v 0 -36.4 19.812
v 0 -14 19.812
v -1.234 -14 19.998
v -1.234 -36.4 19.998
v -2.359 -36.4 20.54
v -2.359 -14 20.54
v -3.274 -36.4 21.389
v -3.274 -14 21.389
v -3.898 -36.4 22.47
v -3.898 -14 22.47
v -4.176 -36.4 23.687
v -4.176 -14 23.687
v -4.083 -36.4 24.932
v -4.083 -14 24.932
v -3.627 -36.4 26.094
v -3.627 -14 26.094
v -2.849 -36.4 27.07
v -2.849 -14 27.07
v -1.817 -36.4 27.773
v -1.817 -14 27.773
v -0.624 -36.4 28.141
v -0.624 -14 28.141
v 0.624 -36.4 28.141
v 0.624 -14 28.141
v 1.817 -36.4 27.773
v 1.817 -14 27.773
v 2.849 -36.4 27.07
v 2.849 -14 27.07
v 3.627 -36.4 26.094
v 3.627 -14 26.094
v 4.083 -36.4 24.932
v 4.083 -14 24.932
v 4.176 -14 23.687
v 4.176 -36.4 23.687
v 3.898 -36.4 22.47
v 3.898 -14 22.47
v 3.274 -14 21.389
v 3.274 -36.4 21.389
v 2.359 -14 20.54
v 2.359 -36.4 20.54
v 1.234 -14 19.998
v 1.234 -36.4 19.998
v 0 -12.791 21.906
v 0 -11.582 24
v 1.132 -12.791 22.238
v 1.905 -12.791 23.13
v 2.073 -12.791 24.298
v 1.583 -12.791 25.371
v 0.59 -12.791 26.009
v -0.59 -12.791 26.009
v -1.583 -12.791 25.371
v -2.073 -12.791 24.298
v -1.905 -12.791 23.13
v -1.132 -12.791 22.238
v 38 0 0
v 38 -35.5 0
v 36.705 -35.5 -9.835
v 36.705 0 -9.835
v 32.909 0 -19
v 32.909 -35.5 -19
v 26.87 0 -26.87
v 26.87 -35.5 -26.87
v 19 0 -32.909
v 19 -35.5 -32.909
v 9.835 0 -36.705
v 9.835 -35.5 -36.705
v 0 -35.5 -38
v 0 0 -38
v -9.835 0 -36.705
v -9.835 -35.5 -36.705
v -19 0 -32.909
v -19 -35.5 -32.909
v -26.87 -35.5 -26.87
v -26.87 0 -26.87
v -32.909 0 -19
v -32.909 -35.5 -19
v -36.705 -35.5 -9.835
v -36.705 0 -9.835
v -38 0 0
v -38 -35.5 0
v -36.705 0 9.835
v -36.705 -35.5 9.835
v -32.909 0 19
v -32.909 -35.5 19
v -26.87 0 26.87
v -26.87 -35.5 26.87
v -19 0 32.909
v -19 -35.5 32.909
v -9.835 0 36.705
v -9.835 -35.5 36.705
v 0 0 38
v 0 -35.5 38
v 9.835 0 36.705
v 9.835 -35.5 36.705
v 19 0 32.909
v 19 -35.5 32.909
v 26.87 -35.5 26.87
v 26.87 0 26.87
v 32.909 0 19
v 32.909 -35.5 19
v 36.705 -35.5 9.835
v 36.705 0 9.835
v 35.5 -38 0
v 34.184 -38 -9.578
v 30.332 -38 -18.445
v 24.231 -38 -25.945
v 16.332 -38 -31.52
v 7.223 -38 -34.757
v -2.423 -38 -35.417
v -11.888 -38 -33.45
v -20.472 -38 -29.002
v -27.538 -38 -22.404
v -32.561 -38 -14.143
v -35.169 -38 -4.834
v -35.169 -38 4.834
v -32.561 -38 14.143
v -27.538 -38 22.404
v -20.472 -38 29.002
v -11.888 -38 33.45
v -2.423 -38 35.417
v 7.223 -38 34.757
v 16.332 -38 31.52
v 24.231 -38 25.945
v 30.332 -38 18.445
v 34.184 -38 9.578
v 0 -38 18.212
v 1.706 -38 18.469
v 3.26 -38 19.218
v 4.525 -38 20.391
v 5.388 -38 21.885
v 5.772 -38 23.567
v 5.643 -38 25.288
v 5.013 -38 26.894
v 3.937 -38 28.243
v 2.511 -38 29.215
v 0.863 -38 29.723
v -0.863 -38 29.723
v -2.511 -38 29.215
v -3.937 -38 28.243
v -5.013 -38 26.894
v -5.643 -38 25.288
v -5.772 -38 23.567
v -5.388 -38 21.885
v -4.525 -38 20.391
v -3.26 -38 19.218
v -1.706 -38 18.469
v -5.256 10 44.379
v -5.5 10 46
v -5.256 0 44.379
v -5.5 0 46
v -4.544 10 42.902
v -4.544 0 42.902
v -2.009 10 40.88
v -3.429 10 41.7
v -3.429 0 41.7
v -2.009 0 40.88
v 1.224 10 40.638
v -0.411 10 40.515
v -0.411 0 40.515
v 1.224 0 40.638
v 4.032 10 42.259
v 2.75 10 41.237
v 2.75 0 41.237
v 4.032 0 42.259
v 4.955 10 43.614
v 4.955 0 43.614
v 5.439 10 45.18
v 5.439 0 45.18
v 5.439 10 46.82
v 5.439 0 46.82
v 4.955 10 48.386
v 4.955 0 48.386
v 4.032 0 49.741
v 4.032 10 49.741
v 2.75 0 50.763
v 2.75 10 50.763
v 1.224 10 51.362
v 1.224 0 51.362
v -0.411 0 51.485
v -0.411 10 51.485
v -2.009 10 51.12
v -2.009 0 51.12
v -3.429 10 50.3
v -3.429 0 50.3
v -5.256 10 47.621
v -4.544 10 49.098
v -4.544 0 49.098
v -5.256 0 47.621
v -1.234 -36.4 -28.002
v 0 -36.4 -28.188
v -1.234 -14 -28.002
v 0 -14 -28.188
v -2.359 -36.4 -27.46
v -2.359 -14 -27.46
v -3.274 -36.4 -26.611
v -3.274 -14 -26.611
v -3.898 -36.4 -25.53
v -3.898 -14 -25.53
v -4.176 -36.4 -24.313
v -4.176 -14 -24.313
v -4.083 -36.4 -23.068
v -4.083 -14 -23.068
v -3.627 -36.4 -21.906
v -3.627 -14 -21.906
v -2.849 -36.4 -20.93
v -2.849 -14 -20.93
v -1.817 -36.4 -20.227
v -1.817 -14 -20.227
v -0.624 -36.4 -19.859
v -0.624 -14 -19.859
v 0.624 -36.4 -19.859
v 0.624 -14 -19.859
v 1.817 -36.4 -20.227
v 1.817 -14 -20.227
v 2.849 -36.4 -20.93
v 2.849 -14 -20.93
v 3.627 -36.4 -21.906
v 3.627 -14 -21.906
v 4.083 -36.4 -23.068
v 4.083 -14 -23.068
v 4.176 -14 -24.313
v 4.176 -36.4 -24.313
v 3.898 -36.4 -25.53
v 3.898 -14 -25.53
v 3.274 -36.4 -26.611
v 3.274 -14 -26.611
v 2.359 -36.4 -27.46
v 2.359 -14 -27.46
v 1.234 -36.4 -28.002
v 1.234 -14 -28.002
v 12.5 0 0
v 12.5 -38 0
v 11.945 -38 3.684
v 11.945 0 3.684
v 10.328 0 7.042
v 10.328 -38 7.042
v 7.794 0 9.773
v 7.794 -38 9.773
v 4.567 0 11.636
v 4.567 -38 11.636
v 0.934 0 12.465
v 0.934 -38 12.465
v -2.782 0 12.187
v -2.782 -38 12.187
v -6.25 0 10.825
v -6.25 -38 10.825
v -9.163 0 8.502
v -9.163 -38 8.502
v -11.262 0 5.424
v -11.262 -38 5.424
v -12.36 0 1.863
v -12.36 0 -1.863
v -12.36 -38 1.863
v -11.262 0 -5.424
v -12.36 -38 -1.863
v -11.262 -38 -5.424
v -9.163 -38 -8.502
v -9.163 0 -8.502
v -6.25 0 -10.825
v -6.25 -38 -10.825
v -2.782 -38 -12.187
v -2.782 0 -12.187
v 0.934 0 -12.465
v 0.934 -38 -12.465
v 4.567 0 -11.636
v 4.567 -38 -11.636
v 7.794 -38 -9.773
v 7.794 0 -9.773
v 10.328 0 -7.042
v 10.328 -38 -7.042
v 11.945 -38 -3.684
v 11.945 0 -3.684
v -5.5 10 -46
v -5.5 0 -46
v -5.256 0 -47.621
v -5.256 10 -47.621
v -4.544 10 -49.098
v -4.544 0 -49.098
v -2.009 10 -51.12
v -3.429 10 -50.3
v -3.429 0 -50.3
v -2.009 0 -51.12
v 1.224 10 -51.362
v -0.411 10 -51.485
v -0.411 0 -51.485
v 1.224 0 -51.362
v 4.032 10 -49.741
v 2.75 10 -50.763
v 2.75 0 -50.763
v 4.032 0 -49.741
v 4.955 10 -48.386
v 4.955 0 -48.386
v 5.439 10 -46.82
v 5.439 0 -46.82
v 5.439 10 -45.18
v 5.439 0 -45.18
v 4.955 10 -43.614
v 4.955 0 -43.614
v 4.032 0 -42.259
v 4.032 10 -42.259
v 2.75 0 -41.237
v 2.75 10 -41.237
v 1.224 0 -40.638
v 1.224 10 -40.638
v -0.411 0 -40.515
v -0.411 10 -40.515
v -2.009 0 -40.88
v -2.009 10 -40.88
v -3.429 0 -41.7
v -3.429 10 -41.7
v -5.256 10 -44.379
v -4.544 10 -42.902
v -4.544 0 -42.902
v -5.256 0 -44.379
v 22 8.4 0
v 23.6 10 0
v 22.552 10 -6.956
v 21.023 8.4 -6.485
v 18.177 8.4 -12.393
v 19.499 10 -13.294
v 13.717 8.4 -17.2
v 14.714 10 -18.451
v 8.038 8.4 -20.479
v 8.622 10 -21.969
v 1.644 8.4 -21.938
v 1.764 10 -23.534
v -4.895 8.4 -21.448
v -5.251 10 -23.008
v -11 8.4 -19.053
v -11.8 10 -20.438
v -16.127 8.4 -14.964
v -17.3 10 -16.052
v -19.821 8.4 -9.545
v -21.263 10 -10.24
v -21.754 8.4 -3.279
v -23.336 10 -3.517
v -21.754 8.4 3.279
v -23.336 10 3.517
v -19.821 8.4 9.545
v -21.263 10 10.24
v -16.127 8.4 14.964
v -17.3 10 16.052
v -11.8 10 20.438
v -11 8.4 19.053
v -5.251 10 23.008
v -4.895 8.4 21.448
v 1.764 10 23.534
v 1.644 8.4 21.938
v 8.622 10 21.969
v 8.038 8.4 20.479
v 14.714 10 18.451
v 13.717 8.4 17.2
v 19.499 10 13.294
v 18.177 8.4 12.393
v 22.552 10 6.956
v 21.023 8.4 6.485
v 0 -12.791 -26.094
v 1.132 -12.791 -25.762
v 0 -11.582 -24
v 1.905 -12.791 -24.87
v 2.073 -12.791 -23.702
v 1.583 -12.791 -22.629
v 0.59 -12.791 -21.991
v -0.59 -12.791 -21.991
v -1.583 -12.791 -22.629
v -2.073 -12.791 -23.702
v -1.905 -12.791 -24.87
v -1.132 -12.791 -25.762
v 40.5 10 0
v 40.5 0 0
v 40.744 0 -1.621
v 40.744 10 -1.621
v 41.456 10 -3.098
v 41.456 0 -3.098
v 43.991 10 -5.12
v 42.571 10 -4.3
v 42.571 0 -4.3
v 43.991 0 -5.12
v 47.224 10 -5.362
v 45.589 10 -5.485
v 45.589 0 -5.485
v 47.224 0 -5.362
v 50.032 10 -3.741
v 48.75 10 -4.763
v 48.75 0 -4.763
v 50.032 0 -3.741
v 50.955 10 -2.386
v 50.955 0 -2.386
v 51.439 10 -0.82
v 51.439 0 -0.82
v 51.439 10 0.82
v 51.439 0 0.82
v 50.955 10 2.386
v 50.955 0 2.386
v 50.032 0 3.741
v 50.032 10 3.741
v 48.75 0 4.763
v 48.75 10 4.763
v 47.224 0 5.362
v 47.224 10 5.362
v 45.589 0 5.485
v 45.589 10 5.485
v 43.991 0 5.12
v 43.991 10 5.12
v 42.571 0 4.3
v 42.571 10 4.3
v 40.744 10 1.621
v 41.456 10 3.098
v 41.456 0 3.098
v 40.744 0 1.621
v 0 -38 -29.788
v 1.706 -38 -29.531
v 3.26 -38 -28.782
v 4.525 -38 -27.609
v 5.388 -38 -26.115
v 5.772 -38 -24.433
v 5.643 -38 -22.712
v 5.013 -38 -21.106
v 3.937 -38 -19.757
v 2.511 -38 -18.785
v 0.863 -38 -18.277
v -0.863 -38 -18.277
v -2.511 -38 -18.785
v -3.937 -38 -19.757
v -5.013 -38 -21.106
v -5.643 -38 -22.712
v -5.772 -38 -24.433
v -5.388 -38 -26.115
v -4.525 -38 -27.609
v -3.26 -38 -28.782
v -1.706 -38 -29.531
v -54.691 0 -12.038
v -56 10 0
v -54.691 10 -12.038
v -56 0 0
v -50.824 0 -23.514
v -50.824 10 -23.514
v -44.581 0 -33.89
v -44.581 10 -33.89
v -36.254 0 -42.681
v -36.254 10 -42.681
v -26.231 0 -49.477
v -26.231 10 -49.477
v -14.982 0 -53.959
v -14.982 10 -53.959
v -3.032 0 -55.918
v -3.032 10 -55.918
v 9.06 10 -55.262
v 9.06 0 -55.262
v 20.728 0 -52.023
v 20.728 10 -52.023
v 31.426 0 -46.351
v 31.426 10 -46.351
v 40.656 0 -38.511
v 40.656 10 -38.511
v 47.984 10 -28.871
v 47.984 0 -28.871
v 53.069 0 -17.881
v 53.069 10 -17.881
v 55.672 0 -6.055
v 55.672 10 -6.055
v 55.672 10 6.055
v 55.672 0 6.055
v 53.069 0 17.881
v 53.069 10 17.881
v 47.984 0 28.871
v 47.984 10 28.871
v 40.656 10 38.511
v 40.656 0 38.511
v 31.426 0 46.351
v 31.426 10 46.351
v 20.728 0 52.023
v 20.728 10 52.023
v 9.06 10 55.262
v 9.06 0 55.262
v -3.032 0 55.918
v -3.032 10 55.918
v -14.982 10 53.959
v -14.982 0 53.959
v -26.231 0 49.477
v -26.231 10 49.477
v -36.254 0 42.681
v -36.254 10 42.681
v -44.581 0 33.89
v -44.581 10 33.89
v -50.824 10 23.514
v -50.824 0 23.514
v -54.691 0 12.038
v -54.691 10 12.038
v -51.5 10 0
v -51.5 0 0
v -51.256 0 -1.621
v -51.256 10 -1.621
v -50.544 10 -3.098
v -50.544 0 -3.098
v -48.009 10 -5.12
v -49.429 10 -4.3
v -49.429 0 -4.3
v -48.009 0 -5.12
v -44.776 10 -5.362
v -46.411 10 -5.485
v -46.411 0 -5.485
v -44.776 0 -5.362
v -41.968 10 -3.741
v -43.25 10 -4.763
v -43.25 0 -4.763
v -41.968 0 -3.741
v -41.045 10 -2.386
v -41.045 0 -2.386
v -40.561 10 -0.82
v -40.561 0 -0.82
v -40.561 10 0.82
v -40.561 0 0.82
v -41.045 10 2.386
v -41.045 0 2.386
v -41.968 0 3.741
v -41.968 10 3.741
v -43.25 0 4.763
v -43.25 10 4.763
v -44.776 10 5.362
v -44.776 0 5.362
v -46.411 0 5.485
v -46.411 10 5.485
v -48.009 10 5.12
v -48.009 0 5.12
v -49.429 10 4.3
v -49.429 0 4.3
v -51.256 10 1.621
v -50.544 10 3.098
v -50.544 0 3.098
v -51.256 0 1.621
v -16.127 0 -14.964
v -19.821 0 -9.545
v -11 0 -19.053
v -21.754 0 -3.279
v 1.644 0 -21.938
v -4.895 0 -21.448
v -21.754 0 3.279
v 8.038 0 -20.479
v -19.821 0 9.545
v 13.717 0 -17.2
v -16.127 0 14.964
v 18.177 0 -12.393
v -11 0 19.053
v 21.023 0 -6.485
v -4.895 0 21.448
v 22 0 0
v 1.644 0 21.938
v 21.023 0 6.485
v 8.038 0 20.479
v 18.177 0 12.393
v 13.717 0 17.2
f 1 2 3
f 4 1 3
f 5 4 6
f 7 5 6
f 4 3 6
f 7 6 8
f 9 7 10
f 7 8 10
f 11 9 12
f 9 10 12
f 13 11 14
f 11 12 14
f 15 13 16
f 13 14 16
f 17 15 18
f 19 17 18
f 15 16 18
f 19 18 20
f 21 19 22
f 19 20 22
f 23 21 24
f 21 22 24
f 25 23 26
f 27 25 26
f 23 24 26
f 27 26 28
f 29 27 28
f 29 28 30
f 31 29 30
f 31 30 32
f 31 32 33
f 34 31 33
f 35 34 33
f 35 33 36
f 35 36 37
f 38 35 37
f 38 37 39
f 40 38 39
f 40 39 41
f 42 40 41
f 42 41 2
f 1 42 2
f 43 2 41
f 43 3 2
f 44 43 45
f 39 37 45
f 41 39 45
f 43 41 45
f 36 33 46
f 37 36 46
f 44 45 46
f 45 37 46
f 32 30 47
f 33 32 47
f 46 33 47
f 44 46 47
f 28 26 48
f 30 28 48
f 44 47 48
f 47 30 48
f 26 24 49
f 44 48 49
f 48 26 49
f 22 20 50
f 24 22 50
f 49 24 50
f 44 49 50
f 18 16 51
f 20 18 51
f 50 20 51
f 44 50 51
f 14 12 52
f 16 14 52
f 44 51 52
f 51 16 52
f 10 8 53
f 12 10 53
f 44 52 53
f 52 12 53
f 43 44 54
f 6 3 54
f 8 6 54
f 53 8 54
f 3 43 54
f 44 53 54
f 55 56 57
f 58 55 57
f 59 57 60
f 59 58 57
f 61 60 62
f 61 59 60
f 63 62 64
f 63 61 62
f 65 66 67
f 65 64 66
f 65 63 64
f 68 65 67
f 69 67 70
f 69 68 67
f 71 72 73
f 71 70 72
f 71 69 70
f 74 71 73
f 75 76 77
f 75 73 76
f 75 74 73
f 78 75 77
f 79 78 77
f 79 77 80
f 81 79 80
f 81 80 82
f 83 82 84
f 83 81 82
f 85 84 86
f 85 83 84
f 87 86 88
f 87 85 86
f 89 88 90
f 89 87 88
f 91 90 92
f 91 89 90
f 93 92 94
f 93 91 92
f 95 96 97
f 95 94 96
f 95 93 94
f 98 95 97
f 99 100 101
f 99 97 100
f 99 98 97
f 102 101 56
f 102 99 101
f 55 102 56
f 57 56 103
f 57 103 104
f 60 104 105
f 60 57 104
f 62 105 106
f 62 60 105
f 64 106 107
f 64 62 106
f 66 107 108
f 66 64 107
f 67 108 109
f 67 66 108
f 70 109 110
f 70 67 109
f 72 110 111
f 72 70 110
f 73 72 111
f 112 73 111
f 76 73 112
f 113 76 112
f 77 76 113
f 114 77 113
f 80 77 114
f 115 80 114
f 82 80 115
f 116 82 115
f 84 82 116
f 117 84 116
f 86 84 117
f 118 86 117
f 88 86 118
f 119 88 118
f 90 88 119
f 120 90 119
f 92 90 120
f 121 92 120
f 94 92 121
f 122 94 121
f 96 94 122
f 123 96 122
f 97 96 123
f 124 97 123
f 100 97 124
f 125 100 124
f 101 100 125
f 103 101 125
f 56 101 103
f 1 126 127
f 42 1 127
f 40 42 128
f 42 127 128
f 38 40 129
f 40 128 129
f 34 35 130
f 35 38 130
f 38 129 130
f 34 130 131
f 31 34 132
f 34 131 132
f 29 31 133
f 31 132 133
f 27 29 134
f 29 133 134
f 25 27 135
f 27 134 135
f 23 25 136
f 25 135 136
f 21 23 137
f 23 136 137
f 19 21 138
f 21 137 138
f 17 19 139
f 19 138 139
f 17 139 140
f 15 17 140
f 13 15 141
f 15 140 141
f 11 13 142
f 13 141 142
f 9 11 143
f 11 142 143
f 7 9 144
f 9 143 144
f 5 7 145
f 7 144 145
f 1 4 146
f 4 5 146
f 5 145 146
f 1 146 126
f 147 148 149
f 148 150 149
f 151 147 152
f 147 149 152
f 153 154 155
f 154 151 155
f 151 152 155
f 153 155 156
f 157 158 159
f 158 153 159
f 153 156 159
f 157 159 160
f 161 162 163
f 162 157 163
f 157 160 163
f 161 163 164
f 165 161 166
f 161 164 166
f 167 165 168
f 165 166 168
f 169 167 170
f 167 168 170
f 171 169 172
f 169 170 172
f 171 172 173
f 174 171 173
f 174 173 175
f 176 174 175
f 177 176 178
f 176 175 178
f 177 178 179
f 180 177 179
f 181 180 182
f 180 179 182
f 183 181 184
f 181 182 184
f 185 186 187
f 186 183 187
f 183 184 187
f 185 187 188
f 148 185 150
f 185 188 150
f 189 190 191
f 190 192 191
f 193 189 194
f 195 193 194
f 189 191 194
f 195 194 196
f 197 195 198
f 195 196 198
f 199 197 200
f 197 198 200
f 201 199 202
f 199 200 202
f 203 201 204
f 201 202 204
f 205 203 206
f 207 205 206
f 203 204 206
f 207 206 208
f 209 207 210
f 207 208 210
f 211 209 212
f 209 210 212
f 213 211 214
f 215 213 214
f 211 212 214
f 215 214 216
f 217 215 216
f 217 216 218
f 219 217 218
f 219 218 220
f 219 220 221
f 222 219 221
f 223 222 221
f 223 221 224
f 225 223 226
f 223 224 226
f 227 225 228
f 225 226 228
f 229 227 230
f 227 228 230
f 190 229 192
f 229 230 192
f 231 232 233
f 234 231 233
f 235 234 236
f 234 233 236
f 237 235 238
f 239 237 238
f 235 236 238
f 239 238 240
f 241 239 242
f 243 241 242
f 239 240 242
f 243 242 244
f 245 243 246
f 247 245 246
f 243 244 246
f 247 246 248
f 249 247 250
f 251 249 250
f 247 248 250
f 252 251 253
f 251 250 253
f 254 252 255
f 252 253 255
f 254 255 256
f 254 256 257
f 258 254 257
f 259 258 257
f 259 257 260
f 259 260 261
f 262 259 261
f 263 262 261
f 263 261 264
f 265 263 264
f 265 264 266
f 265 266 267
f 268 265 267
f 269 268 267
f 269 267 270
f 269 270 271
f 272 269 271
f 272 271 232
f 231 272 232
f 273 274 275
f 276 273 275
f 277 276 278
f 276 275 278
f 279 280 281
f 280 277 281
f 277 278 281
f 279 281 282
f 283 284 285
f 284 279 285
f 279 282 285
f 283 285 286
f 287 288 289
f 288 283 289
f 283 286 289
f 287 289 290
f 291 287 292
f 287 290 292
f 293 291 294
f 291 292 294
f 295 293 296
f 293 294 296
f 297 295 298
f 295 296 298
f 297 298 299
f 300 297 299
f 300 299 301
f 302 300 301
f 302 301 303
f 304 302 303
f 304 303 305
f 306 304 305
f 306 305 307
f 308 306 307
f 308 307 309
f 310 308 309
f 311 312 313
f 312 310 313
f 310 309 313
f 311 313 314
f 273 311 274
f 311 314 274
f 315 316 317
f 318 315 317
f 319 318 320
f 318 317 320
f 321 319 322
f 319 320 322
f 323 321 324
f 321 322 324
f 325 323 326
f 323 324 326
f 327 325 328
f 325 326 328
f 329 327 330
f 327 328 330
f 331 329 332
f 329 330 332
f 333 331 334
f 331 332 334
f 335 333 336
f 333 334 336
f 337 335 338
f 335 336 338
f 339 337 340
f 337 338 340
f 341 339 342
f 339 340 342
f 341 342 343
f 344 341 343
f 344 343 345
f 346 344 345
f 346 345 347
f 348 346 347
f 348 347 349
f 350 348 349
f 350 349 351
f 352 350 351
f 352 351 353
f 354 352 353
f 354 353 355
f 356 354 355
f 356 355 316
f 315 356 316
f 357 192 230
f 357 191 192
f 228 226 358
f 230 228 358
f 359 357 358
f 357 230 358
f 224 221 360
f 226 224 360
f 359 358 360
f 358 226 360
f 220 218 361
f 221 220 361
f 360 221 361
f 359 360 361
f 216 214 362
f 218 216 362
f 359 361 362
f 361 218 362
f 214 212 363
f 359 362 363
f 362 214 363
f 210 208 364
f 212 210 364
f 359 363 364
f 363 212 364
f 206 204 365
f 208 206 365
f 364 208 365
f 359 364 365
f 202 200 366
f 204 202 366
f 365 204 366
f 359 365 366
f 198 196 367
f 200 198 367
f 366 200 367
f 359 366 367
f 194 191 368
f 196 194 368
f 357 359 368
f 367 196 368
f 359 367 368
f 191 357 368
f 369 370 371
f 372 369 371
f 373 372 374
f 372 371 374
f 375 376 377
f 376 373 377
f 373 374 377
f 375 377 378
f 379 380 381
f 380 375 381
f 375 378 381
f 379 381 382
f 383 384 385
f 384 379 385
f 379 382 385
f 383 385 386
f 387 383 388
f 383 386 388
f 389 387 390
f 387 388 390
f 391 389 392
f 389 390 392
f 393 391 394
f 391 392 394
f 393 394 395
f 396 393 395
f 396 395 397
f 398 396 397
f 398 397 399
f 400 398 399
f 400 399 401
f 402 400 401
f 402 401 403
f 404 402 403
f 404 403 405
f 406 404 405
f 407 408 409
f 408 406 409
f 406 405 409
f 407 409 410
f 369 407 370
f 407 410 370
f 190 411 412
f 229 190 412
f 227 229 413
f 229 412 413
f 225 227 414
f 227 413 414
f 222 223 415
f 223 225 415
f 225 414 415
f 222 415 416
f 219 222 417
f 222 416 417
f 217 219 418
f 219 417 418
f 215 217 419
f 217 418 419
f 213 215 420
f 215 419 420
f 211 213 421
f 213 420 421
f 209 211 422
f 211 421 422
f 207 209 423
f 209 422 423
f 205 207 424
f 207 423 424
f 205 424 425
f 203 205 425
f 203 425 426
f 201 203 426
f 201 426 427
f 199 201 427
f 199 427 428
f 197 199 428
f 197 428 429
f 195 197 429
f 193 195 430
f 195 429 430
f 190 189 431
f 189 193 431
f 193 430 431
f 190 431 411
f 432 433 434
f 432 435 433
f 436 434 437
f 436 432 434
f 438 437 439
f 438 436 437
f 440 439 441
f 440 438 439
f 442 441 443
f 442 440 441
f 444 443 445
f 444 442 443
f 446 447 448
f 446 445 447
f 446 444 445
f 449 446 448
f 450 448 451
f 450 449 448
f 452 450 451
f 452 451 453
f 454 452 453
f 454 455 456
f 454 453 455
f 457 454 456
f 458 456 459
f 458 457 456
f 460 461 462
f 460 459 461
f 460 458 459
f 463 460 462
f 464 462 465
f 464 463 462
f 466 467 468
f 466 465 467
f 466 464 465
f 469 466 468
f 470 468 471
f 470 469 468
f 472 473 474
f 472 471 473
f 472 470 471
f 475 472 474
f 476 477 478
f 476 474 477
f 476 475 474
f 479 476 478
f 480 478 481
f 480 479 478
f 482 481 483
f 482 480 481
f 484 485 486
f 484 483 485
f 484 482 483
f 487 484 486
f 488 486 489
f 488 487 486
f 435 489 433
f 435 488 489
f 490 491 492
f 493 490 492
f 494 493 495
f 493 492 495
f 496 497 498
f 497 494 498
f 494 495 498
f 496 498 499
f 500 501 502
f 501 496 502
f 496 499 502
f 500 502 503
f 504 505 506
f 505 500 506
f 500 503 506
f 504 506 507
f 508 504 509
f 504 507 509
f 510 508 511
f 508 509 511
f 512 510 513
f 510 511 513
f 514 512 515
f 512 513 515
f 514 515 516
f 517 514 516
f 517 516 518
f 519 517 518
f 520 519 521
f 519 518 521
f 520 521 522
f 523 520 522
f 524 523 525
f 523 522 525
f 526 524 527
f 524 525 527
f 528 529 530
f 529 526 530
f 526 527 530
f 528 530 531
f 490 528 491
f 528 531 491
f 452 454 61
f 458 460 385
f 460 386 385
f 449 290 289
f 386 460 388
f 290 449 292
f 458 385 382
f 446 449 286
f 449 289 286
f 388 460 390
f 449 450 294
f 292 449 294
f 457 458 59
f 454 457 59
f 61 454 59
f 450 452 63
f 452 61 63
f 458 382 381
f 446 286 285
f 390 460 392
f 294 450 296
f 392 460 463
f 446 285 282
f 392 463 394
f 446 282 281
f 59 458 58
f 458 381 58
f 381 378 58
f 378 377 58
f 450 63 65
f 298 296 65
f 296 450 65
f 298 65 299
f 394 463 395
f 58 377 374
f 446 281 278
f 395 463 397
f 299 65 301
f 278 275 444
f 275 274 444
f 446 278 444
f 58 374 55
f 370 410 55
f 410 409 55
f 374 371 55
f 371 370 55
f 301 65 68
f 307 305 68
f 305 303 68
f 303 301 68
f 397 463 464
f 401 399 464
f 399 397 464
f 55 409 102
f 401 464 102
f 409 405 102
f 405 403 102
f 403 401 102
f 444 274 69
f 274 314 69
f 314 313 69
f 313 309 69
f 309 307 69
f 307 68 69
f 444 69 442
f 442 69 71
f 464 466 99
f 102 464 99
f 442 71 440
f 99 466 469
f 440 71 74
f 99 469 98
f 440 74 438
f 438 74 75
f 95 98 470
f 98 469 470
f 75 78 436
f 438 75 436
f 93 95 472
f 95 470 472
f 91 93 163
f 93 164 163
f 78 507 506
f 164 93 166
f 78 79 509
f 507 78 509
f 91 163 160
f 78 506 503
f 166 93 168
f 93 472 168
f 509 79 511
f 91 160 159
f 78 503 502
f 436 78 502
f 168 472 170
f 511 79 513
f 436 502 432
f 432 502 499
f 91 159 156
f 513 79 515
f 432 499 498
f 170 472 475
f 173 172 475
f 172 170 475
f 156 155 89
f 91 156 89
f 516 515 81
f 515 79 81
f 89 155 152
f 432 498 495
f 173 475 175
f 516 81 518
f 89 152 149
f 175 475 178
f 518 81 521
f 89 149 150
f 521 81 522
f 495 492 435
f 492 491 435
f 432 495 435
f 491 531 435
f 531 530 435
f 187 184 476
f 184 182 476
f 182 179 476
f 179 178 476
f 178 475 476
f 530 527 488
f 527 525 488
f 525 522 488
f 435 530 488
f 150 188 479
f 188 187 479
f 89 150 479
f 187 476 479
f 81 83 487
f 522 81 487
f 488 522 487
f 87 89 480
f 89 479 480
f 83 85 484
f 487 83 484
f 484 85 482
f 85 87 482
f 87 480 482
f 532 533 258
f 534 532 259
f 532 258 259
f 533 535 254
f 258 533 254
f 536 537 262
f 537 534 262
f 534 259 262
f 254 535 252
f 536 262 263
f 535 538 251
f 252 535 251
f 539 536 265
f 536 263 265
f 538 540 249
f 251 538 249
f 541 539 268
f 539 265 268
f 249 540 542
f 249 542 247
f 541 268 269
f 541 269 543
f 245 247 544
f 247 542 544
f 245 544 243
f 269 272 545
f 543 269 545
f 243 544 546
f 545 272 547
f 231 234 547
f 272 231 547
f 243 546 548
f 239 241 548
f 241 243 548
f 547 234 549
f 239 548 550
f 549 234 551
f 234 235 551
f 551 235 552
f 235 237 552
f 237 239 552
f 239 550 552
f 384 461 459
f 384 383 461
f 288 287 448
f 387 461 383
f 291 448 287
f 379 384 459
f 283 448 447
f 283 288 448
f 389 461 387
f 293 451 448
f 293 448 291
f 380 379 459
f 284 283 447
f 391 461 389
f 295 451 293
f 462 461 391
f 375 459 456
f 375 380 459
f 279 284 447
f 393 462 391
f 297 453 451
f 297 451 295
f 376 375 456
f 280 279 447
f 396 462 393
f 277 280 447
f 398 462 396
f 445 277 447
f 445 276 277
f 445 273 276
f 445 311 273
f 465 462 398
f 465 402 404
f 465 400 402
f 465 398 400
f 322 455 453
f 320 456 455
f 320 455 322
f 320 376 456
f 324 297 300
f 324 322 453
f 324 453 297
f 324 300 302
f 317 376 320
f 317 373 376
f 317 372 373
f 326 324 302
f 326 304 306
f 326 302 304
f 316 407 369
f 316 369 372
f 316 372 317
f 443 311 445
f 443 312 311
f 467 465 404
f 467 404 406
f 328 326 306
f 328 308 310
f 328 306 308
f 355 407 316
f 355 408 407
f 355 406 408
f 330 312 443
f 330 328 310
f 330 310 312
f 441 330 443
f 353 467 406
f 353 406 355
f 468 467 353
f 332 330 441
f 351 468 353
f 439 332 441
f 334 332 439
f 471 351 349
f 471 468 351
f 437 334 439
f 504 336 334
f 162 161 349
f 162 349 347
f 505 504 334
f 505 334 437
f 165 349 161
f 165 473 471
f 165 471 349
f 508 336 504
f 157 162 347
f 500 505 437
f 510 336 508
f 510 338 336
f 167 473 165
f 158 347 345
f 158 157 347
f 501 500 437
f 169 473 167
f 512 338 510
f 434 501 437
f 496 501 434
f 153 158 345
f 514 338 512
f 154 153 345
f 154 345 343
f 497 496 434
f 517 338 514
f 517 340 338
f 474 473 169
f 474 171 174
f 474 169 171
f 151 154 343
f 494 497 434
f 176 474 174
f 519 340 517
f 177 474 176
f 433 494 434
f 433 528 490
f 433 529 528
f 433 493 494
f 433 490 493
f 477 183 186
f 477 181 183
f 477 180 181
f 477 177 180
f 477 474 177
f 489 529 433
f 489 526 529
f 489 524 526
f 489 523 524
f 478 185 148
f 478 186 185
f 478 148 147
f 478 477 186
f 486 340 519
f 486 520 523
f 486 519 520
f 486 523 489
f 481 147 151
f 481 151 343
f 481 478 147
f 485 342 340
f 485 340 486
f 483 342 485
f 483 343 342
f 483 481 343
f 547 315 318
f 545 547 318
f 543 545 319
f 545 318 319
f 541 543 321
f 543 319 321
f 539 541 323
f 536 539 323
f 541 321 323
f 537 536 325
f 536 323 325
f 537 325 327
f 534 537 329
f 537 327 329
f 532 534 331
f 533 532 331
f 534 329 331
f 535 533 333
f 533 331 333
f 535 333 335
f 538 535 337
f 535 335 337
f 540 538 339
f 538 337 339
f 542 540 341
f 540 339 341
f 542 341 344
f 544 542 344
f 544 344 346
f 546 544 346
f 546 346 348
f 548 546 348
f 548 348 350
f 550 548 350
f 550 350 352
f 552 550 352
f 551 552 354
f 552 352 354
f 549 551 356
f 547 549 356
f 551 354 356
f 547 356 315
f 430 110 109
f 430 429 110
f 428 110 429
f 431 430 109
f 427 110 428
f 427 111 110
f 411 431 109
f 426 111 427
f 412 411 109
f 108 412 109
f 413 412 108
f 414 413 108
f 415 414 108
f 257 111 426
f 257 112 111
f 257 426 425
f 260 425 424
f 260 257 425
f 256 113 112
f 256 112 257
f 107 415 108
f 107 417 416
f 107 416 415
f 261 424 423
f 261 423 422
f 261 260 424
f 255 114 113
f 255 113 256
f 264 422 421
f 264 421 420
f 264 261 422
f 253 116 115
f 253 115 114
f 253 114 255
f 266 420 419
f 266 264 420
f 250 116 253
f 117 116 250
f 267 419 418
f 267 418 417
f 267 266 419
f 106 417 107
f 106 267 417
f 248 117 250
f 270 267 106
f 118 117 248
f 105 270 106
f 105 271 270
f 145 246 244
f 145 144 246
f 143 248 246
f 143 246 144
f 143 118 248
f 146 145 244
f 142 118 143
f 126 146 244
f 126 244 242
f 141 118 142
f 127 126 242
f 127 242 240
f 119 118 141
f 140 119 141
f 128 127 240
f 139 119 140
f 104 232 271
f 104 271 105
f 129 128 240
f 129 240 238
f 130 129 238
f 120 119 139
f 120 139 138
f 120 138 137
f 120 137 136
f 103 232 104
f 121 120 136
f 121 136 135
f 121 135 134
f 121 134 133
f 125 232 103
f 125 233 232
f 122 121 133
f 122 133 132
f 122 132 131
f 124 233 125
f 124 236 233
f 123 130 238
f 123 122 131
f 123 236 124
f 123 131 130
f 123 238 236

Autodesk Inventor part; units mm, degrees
ref_plane "YZ Plane" through (0, 0, 0) normal (1, 0, 0) x (0, 1, 0)
ref_plane "XZ Plane" through (0, 0, 0) normal (0, 1, 0) x (-1, 0, 0)
ref_plane "XY Plane" through (0, 0, 0) normal (0, 0, 1) x (1, 0, 0)
sketch "Эскиз1" plane through (0, 0, 0) normal (0, 1, 0) x (-1, 0, 0)
  circle A0 centre (0, 0) radius 56
  circle A1 centre (46, 0) radius 5.5
  circle A2 centre (0, 46) radius 5.5
  circle A3 centre (-46, 0) radius 5.5
  circle A4 centre (0, -46) radius 5.5
  dimension "d0" = 112
  dimension "d1" = 11
  dimension "d2" = 46
  dimension "d5" = 360
extrude "Выдавливание1" add sketch "Эскиз1" along normal blind 10
sketch "Эскиз3" plane through (0, 10, 0) normal (0, 1, 0) x (1, 0, 0)
  circle A0 centre (0, 0) radius 22
  dimension "d9" = 44
extrude "Выдавливание2" cut sketch "Эскиз3" against normal blind 10
sketch "Эскиз4" plane through (0, 0, 0) normal (0, -1, 0) x (1, 0, 0)
  circle A0 centre (0, 0) radius 38
  dimension "d12" = 76
extrude "Выдавливание3" add sketch "Эскиз4" along normal blind 38
sketch "Эскиз5" plane through (0, -38, 0) normal (0, -1, 0) x (1, 0, 0)
  circle A0 centre (0, 0) radius 12.5
  dimension "d15" = 25
extrude "Выдавливание4" cut sketch "Эскиз5" against normal through all
chamfer "Фаска1" distance 1.6 angle 45 1 edges at (-22, 10, 0)
chamfer "Фаска2" distance 2.5 angle 45 1 edges at (-38, -38, 0)
sketch "Эскиз6" plane through (0, -38, 0) normal (0, -1, 0) x (1, 0, 0)
  point P0 (0, 0)
  point P1 (0, -24)
  point P2 (0, 24)
  dimension "d24" = 24
  dimension "d25" = 48
hole "Отверстие1" at (0, -38, -24) at (0, -38, 24) direction (0, 1, 0) diameter 8.376 depth 24 tip angle 120 thread size "M10x1.5" class "6H" standard "ISO Metric profile"
chamfer "Фаска3" distance 1.6 angle 45 2 edges at (0, -38, -19.812) (0, -38, 28.188)
properties part number "Фланец"
